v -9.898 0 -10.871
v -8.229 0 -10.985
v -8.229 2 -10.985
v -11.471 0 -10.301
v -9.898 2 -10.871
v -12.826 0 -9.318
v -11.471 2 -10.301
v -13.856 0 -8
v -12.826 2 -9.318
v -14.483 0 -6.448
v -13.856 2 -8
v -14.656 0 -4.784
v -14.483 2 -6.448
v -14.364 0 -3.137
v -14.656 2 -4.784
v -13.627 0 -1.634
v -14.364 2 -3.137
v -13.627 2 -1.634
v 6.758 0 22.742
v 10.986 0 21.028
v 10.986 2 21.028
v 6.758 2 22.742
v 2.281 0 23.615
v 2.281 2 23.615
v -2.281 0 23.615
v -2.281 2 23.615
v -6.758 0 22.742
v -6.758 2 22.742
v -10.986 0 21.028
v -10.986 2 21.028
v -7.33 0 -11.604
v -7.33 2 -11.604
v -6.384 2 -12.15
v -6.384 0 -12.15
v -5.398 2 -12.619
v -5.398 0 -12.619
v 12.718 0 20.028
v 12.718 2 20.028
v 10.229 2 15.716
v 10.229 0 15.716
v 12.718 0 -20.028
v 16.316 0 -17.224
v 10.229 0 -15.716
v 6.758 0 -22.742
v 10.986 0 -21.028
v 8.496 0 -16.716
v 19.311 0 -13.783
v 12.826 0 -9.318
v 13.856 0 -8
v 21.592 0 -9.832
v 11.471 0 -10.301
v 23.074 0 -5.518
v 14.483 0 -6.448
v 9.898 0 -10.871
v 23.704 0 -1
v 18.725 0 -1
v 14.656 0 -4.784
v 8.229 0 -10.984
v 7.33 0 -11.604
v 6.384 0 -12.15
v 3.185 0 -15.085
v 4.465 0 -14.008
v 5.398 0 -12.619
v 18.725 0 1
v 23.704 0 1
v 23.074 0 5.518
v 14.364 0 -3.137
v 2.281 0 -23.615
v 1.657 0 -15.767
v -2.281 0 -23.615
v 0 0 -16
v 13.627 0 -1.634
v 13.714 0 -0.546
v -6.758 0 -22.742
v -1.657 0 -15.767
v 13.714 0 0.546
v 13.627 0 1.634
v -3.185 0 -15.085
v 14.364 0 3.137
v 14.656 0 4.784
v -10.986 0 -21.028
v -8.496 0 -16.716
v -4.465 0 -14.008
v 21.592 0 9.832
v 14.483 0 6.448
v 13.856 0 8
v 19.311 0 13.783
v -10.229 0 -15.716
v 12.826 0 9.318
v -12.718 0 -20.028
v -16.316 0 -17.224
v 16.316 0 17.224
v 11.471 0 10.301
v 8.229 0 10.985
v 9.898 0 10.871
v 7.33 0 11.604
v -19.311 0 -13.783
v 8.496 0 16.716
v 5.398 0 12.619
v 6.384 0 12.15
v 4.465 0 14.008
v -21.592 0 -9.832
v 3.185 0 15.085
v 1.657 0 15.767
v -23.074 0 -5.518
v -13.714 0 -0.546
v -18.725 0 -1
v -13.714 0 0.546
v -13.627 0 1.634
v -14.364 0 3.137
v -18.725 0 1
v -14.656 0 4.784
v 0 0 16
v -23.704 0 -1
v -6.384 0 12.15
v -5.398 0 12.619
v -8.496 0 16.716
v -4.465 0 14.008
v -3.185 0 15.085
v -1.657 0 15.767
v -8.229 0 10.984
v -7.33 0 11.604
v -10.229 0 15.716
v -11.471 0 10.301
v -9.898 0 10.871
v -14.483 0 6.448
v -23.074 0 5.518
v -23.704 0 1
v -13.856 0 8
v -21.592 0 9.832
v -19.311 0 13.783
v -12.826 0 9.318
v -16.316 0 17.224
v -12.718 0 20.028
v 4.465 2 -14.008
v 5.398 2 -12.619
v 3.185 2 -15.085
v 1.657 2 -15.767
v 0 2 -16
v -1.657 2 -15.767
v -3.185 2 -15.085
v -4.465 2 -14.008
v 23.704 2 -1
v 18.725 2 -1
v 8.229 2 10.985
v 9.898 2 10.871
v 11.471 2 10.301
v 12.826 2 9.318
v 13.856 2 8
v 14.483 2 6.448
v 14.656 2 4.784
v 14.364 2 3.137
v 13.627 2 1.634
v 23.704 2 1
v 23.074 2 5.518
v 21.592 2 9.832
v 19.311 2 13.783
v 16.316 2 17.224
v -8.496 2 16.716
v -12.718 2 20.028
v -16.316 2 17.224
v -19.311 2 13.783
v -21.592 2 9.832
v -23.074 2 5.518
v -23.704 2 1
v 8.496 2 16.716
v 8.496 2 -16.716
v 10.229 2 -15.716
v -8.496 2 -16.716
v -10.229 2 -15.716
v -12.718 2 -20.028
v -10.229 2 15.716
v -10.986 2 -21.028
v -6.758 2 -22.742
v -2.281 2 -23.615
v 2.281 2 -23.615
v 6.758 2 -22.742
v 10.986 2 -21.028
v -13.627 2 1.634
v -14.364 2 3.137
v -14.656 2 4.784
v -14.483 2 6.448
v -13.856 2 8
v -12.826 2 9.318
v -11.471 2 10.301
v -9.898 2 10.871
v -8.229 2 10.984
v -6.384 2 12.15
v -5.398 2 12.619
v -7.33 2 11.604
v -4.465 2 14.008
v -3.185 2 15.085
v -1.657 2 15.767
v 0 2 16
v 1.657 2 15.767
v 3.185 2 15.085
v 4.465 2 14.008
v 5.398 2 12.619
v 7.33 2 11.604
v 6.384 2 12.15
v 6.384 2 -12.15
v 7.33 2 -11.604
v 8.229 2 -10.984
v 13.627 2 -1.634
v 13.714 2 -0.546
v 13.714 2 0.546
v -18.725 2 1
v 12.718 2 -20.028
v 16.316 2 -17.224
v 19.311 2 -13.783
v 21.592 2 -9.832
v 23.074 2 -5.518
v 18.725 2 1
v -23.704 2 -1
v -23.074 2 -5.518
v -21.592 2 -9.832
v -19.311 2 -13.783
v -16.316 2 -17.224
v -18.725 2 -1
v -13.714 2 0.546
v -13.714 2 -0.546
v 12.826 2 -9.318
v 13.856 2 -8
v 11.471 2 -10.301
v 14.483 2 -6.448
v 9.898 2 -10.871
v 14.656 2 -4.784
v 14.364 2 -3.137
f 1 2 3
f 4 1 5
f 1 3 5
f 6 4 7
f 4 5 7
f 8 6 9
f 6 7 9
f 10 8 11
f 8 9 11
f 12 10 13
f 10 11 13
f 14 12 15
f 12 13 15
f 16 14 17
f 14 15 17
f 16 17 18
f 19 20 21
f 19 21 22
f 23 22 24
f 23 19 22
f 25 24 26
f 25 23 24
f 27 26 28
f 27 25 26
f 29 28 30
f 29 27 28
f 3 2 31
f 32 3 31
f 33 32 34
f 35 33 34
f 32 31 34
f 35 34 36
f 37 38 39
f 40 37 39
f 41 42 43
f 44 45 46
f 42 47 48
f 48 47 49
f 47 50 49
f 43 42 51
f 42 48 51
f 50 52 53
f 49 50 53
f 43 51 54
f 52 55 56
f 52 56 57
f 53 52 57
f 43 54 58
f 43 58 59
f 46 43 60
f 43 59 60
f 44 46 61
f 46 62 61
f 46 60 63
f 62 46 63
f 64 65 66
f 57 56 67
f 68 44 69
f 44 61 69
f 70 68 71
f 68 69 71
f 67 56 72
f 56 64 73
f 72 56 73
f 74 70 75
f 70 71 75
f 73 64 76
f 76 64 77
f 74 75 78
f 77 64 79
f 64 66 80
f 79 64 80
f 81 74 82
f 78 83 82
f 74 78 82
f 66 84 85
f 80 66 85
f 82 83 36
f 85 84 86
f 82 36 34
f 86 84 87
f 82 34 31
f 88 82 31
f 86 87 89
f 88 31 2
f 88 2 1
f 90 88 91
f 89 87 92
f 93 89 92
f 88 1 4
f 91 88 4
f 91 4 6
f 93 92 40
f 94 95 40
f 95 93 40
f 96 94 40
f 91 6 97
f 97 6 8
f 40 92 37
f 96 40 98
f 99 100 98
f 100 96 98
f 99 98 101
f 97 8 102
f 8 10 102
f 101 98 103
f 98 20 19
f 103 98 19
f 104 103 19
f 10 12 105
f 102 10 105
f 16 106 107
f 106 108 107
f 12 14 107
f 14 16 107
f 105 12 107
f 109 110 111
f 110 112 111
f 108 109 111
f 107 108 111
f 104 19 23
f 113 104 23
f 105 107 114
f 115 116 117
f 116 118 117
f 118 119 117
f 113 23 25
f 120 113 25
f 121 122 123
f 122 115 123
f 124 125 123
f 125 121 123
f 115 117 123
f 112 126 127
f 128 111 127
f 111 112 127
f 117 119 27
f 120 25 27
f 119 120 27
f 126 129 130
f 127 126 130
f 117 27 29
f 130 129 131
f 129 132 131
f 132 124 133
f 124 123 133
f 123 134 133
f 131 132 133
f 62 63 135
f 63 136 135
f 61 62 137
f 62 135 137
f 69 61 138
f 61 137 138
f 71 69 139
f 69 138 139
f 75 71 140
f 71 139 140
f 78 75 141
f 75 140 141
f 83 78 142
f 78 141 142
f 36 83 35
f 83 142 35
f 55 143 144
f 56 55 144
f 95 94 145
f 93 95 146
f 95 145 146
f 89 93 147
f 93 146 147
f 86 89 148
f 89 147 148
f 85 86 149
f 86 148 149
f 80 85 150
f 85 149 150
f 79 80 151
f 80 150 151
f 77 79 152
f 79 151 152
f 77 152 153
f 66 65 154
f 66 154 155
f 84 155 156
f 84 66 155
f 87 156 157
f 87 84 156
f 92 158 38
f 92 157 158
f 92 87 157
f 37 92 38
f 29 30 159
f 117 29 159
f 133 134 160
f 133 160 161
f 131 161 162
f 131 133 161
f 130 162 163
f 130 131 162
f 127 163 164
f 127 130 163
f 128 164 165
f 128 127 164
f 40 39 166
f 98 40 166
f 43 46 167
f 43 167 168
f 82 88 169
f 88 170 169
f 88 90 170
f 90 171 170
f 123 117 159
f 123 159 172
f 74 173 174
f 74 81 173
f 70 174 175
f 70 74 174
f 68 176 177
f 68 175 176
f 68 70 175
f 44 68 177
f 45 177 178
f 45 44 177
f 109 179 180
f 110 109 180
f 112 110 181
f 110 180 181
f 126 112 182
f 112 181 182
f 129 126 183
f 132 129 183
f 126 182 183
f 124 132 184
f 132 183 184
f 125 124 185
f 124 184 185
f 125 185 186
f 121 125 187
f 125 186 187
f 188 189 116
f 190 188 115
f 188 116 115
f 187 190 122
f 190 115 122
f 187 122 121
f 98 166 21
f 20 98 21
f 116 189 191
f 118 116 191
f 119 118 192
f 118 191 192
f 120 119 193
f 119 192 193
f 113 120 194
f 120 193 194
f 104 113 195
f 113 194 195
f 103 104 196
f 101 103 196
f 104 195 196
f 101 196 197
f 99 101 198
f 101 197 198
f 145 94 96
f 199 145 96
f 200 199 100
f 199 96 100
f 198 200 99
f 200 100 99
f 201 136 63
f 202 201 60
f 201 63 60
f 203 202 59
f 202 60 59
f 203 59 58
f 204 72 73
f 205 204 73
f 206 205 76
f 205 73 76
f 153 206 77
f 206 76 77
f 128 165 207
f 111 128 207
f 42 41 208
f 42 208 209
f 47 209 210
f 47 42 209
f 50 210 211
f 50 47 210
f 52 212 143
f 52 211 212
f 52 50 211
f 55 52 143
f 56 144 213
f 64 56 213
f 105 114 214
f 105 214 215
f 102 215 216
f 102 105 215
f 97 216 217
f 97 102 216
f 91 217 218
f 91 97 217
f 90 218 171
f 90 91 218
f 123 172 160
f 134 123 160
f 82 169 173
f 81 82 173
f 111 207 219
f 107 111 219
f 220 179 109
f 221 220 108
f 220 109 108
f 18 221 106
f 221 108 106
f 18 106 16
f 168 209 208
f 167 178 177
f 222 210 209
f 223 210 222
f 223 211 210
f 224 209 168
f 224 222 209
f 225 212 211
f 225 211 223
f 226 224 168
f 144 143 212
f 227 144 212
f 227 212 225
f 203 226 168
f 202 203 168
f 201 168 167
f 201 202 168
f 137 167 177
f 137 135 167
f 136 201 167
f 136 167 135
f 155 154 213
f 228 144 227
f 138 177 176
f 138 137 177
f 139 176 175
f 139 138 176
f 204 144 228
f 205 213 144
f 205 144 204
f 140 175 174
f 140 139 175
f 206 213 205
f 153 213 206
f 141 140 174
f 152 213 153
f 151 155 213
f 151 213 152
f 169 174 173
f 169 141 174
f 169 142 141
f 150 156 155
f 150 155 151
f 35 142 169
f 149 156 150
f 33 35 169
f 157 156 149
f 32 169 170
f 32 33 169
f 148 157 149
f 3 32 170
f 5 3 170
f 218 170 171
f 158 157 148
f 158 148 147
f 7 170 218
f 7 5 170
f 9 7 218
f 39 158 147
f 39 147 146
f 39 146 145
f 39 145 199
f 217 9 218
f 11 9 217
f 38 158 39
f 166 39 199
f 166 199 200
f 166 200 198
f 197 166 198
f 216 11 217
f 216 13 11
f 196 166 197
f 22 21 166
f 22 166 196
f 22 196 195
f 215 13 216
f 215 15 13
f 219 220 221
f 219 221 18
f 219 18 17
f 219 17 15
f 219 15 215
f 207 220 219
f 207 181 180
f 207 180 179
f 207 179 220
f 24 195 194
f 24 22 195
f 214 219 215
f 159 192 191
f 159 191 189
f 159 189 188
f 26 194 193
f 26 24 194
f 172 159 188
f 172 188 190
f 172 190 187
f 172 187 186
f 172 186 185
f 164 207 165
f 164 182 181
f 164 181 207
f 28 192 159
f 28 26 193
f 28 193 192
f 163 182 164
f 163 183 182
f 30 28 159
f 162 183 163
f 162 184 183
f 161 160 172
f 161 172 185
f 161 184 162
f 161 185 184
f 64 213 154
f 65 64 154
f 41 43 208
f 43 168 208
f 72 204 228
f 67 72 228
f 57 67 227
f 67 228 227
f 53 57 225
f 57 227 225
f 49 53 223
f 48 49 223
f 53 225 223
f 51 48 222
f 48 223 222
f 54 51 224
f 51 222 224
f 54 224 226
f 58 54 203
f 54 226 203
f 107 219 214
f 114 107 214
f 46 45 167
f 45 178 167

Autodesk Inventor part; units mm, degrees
ref_plane "YZ Plane" through (0, 0, 0) normal (1, 0, 0) x (0, 1, 0)
ref_plane "XZ Plane" through (0, 0, 0) normal (0, 1, 0) x (-1, 0, 0)
ref_plane "XY Plane" through (0, 0, 0) normal (0, 0, 1) x (1, 0, 0)
sketch "Sketch1" plane through (0, 0, 0) normal (0, 1, 0) x (-1, 0, 0)
  circle A0 centre (0, 0) radius 23.725
  circle A1 centre (0, 0) radius 13.725
  dimension "d0" = 47.45
  dimension "d1" = 27.45
extrude "Extrusion1" add sketch "Sketch1" along normal blind 2
sketch "Sketch2" plane through (0, 2, 0) normal (0, 1, 0) x (1, 0, 0)
  line L0 (-28.725, -1) -> (-18.725, -1)
  line L1 (-18.725, -1) -> (-18.725, 1)
  line L2 (-18.725, 1) -> (-28.725, 1)
  line L3 (-28.725, 1) -> (-28.725, -1)
  point P0 (0, 0)
  dimension "d4" = 1
  dimension "d5" = 2
  dimension "d6" = 18.725
  dimension "d7" = 10
extrude "Extrusion2" cut sketch "Sketch2" against normal blind 2
pattern_circular "Circular Pattern1" count 6 over 360 about axis through (0, -10, 0) along (0, 1, 0) of "Extrusion2"
sketch "Sketch3" plane through (0, 2, 0) normal (0, 1, 0) x (1, 0, 0)
  circle A0 centre (-8.6603, -5) radius 6
  line L0 (-8.6603, -5) -> (0, 0) construction
  line L1 (-33.1855, 0) -> (33.1855, 0) projected
  dimension "d13" = 30
  dimension "d14" = 5
  dimension "d15" = 12
extrude "Extrusion3" cut sketch "Sketch3" against normal blind 2
pattern_circular "Circular Pattern2" count 6 over 360 about axis through (0, -10, 0) along (0, 1, 0) of "Extrusion3"
properties part number "Ring_n3"
